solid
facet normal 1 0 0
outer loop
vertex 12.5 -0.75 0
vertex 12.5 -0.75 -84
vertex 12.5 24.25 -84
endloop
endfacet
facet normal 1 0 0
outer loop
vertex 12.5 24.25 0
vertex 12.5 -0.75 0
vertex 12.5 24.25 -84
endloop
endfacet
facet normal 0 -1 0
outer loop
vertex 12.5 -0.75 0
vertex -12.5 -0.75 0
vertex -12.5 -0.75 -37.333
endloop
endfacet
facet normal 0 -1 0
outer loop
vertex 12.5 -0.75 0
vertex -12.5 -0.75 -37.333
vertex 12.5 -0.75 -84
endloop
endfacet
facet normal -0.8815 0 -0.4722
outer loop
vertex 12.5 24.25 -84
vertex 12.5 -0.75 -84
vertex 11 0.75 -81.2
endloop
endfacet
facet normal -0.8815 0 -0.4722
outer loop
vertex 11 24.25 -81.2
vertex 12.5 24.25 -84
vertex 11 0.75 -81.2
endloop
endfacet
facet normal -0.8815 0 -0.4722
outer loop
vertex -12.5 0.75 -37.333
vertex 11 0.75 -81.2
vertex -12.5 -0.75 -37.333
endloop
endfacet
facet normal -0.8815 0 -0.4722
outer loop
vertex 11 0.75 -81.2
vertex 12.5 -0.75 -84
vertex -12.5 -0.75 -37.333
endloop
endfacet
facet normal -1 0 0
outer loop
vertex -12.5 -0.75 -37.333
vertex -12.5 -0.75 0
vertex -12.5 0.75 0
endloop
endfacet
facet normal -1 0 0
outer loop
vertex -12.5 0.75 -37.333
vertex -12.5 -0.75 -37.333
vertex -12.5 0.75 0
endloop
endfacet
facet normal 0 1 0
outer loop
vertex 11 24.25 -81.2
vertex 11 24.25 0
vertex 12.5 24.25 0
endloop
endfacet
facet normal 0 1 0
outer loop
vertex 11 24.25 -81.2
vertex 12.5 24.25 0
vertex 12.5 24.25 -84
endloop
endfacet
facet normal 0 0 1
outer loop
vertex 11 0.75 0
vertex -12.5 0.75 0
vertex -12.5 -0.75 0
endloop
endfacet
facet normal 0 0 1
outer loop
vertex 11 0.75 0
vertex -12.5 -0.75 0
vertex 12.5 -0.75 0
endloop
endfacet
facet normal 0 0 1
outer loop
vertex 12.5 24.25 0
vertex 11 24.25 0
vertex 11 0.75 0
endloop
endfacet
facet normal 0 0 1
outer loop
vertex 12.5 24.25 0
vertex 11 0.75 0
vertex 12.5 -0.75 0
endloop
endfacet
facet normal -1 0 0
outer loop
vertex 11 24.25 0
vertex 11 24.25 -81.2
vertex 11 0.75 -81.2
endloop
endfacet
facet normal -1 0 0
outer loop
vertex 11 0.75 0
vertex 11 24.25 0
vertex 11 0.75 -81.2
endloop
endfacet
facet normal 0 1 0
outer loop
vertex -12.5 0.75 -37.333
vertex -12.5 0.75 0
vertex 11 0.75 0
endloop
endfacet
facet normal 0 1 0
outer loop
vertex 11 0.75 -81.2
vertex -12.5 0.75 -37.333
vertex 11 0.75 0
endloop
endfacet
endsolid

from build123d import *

# Parameters (mm, degrees)
F0_W     = 1.5
F0_H     = 1.5
F0_H_2   = 23.5
F0_W_2   = 23.5
F1_DEPTH = 84
F3_DEPTH = 25


with BuildPart() as f1:
    # F0 (on Top) → F1 (new body)
    with BuildSketch(Plane.XY):
        with Locations((11.75, 0)):
            Rectangle(F0_W, F0_H)
        with Locations((11.75, 12.5)):
            Rectangle(F0_W, F0_H_2)
        with Locations((-0.75, 0)):
            Rectangle(F0_W_2, F0_H)
    extrude(amount=-F1_DEPTH)

    # F2 (on face) → F3 (cut)
    with BuildSketch(Plane.XZ.offset(0.75)):
        Polygon((-12.5, -84), (12.5, -84), (-12.5, -37.333333), align=None)
    extrude(amount=-F3_DEPTH, mode=Mode.SUBTRACT)


solid = f1.part
